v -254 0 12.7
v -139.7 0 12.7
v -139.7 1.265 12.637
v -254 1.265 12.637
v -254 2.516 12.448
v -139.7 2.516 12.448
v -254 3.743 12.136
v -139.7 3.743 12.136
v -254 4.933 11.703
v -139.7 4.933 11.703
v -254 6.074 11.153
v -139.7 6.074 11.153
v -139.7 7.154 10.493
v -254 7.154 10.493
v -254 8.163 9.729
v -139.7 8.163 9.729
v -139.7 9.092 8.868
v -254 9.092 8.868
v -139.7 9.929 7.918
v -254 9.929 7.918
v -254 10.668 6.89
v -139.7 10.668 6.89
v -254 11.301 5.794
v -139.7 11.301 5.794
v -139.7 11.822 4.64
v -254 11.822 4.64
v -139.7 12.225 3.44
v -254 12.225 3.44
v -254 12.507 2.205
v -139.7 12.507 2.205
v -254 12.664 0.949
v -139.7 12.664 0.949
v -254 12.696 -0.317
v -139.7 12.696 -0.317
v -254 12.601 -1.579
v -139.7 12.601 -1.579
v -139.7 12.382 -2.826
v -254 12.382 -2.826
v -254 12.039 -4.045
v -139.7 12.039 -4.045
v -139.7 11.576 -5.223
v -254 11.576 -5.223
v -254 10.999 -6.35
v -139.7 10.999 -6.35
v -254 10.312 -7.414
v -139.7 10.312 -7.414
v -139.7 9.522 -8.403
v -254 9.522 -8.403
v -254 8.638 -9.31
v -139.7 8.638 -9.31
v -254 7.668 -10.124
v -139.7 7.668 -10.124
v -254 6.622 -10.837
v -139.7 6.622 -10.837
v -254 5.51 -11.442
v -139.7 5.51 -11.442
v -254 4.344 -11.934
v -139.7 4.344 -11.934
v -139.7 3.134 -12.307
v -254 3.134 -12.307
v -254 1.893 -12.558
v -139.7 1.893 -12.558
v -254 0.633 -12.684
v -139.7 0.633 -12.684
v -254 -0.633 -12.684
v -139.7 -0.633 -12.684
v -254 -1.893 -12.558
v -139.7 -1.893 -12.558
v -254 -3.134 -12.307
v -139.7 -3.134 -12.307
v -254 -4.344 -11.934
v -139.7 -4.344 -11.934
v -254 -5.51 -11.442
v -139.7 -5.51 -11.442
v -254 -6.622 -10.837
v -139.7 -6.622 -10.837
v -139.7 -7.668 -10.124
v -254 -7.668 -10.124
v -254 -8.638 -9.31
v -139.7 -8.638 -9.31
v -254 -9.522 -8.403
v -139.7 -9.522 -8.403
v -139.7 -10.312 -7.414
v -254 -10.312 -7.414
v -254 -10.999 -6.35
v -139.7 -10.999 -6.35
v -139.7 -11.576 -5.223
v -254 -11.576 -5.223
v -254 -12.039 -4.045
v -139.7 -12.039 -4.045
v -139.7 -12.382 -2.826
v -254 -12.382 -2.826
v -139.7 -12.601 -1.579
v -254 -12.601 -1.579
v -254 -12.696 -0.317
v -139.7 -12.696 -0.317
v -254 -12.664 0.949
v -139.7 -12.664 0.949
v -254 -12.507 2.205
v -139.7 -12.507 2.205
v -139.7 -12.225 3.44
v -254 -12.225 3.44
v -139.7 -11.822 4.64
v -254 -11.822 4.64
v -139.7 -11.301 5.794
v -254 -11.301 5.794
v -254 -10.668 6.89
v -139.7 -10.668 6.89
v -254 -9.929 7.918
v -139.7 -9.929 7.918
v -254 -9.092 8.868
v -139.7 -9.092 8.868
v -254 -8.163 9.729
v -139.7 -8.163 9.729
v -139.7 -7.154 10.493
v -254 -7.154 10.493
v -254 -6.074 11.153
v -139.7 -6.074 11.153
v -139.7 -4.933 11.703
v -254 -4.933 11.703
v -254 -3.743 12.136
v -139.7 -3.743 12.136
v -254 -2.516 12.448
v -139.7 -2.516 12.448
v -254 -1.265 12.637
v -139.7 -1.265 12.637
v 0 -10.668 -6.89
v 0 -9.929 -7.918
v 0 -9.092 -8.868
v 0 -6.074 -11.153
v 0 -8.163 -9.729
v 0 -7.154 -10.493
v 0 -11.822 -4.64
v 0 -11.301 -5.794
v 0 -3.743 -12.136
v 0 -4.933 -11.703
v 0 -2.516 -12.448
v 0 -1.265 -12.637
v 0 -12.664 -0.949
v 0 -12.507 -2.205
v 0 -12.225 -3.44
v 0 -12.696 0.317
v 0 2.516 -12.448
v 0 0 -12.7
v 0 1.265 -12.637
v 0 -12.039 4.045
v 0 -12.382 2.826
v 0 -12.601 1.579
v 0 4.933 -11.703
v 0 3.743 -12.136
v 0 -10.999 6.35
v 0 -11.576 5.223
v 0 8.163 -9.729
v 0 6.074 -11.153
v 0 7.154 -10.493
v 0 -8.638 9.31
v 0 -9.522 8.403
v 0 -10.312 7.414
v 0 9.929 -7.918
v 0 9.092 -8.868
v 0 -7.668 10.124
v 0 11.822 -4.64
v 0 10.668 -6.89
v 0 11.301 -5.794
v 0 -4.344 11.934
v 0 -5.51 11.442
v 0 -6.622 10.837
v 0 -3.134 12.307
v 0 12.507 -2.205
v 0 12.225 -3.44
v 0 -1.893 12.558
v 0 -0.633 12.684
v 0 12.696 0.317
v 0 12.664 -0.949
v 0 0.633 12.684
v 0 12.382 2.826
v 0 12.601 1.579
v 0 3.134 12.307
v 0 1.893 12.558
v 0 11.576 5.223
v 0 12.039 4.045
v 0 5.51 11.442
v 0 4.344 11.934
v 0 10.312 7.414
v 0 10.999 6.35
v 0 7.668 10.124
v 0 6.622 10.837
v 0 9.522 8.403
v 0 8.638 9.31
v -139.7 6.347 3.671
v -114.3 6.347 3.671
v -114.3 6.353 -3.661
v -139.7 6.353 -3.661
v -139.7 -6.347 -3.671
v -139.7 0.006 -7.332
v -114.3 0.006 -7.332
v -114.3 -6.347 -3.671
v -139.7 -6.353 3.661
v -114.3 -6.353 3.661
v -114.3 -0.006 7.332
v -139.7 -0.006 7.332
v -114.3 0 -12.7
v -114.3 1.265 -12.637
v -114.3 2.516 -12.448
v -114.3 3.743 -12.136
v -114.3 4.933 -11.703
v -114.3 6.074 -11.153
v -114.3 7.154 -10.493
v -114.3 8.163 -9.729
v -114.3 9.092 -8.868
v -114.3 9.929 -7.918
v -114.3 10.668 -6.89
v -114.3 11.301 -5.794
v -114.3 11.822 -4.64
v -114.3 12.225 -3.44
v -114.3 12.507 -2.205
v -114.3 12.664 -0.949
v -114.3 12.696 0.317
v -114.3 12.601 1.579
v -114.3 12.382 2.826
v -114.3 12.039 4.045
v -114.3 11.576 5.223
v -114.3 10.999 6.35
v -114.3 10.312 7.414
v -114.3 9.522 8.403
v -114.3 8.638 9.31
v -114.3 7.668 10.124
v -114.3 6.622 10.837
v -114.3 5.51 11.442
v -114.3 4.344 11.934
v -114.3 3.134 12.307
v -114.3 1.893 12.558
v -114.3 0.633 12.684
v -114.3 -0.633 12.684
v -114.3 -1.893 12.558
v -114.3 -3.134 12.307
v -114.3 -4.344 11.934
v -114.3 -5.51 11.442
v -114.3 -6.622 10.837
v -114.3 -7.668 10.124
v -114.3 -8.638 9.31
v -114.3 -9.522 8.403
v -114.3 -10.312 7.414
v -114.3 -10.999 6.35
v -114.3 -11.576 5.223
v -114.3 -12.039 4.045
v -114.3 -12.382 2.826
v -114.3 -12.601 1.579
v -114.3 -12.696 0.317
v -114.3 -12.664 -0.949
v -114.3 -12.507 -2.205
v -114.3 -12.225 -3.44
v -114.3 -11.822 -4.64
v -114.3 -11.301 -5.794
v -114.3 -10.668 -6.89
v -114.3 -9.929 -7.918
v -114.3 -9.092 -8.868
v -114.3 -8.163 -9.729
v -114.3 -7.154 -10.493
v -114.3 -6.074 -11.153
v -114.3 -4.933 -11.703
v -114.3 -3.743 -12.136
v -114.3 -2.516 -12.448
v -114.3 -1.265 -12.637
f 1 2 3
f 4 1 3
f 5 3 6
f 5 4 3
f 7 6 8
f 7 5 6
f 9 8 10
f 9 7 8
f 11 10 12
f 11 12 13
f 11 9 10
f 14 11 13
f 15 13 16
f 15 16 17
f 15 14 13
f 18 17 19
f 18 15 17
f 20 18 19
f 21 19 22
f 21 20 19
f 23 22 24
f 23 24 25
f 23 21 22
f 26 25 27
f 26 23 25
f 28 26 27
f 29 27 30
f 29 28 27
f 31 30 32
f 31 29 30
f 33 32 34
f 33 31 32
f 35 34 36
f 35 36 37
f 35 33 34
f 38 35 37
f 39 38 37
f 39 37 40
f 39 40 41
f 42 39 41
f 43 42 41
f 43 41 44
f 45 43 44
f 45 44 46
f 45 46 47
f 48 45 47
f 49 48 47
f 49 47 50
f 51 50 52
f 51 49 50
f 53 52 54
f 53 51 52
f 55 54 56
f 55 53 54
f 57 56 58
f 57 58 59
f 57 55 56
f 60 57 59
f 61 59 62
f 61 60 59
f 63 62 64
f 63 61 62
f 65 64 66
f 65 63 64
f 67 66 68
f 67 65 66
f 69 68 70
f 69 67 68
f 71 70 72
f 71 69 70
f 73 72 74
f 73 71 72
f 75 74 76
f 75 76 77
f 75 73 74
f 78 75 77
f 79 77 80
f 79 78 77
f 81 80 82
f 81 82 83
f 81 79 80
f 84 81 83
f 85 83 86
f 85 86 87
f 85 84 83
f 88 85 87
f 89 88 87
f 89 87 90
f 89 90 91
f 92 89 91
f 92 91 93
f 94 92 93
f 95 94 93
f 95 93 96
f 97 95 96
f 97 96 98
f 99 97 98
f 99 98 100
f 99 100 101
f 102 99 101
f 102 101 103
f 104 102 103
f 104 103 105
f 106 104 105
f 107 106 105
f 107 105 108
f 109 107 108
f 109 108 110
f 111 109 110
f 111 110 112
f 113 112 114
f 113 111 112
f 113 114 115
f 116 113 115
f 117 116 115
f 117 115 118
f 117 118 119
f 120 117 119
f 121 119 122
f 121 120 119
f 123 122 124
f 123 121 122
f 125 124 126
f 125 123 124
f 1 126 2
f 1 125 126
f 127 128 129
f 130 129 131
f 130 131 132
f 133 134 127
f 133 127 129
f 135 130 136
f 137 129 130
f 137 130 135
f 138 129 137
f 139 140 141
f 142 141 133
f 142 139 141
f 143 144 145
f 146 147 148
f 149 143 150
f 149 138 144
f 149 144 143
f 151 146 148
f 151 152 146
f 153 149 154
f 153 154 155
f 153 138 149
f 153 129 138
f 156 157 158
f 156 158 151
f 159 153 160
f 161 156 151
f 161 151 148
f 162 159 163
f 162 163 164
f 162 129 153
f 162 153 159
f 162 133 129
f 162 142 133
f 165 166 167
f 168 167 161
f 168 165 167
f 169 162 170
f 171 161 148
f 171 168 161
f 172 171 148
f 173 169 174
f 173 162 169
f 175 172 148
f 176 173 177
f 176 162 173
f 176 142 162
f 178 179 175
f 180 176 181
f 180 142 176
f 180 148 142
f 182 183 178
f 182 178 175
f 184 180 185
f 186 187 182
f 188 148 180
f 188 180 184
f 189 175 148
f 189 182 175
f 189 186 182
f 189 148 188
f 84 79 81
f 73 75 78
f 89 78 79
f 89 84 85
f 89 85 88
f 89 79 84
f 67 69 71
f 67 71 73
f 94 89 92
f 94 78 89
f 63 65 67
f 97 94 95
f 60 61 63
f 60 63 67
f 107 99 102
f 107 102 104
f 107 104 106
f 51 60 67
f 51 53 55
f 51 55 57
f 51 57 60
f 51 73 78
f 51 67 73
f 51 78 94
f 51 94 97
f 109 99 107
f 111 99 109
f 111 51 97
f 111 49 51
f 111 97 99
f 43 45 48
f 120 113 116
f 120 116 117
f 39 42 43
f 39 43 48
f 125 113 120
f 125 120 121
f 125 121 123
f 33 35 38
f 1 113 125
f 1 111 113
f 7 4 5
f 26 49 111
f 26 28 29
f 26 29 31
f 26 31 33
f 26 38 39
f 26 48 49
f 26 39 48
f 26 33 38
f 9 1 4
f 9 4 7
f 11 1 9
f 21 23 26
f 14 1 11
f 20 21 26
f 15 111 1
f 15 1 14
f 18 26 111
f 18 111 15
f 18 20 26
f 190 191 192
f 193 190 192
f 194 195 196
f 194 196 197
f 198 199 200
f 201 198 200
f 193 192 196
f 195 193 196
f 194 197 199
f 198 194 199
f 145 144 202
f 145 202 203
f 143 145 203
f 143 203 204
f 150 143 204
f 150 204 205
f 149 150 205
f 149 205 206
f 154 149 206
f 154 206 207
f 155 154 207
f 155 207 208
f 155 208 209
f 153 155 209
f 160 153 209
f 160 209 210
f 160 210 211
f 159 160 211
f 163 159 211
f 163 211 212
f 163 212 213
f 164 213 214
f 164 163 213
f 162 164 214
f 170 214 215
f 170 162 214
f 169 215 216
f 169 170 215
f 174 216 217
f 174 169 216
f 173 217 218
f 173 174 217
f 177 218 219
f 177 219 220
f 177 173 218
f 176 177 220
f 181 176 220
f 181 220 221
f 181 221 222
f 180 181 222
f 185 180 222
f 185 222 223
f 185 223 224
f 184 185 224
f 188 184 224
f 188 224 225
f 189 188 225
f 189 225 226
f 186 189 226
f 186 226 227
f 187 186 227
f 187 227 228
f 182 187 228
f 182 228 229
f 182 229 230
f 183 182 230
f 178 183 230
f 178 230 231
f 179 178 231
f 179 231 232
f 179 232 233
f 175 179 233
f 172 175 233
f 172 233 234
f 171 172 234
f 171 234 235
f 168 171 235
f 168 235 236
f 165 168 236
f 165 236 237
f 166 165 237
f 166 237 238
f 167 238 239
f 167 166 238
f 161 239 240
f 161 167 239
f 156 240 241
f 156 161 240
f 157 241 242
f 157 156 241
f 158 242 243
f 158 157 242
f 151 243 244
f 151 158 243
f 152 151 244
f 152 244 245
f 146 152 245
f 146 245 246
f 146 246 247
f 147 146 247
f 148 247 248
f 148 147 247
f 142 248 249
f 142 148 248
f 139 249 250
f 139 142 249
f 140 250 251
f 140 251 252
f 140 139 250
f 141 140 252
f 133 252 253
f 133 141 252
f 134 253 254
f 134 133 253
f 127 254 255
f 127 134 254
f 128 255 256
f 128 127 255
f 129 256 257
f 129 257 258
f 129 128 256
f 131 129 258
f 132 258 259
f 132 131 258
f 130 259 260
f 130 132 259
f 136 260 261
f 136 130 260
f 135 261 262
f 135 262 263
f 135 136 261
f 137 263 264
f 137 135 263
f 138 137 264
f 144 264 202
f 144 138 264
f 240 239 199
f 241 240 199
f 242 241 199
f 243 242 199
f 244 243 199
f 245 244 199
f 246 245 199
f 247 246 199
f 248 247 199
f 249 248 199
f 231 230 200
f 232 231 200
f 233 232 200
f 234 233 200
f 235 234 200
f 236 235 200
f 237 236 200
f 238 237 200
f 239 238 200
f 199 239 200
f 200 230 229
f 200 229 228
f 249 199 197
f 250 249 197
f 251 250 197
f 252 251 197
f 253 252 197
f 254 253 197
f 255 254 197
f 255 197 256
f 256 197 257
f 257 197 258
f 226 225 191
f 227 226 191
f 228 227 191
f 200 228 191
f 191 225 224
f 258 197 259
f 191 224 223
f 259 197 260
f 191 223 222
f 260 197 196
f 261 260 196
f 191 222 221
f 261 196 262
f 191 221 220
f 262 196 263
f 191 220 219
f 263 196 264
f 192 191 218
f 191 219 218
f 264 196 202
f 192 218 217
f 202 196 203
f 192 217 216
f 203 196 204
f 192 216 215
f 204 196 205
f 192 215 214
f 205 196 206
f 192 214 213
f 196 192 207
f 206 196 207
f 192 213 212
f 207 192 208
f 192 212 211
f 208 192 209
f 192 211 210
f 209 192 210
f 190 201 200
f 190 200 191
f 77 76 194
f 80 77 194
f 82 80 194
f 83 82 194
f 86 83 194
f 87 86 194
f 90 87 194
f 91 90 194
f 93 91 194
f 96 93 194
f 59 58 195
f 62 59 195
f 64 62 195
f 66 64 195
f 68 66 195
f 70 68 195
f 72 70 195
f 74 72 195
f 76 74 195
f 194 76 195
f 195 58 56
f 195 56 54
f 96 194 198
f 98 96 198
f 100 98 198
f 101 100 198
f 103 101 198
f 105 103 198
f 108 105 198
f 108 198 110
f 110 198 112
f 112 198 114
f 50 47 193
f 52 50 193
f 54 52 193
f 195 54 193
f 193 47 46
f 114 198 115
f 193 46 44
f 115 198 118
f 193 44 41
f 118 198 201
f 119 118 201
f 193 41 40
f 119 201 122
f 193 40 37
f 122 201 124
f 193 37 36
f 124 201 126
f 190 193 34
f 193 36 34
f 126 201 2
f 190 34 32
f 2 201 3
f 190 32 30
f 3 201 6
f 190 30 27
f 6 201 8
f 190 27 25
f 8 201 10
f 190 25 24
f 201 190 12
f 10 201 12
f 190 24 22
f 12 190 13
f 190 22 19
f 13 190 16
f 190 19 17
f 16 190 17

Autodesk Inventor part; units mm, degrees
ref_plane "YZ Plane" through (0, 0, 0) normal (1, 0, 0) x (0, 1, 0)
ref_plane "XZ Plane" through (0, 0, 0) normal (0, 1, 0) x (-1, 0, 0)
ref_plane "XY Plane" through (0, 0, 0) normal (0, 0, 1) x (1, 0, 0)
sketch "Sketch1" plane through (0, 0, 0) normal (1, 0, 0) x (0, 1, 0)
  circle A0 centre (0, 0) radius 12.7
  dimension "d0" = 25.4
extrude "Extrusion1" add sketch "Sketch1" against normal blind 254
sketch "Sketch2" plane through (0, 0, 0) normal (1, 0, 0) x (0, 0, -1)
  line L0 (3.6609, 6.353) -> (7.3323, 0.006)
  line L1 (7.3323, 0.006) -> (3.6714, -6.347)
  line L2 (3.6714, -6.347) -> (-3.6609, -6.353)
  line L3 (-3.6609, -6.353) -> (-7.3323, -0.006)
  line L4 (-7.3323, -0.006) -> (-3.6714, 6.347)
  line L5 (-3.6714, 6.347) -> (3.6609, 6.353)
  circle A0 centre (0, 0) radius 12.7
  dimension "d3" = 6.35
extrude "Extrusion2" cut sketch "Sketch2" against normal blind 254
extrude "Extrusion3" add sketch "Sketch2" against normal blind 114.3 contours L0 L1 L2 L3 L4 L5 | A0
sketch "Sketch3" plane through (-254, 0, 0) normal (-1, 0, 0) x (0, 0, 1)
  circle A0 centre (0, 0) radius 12.7 projected
  circle A1 centre (0, 0) radius 12.7
extrude "Extrusion4" add sketch "Sketch3" against normal blind 114.3
properties part number "pin"
